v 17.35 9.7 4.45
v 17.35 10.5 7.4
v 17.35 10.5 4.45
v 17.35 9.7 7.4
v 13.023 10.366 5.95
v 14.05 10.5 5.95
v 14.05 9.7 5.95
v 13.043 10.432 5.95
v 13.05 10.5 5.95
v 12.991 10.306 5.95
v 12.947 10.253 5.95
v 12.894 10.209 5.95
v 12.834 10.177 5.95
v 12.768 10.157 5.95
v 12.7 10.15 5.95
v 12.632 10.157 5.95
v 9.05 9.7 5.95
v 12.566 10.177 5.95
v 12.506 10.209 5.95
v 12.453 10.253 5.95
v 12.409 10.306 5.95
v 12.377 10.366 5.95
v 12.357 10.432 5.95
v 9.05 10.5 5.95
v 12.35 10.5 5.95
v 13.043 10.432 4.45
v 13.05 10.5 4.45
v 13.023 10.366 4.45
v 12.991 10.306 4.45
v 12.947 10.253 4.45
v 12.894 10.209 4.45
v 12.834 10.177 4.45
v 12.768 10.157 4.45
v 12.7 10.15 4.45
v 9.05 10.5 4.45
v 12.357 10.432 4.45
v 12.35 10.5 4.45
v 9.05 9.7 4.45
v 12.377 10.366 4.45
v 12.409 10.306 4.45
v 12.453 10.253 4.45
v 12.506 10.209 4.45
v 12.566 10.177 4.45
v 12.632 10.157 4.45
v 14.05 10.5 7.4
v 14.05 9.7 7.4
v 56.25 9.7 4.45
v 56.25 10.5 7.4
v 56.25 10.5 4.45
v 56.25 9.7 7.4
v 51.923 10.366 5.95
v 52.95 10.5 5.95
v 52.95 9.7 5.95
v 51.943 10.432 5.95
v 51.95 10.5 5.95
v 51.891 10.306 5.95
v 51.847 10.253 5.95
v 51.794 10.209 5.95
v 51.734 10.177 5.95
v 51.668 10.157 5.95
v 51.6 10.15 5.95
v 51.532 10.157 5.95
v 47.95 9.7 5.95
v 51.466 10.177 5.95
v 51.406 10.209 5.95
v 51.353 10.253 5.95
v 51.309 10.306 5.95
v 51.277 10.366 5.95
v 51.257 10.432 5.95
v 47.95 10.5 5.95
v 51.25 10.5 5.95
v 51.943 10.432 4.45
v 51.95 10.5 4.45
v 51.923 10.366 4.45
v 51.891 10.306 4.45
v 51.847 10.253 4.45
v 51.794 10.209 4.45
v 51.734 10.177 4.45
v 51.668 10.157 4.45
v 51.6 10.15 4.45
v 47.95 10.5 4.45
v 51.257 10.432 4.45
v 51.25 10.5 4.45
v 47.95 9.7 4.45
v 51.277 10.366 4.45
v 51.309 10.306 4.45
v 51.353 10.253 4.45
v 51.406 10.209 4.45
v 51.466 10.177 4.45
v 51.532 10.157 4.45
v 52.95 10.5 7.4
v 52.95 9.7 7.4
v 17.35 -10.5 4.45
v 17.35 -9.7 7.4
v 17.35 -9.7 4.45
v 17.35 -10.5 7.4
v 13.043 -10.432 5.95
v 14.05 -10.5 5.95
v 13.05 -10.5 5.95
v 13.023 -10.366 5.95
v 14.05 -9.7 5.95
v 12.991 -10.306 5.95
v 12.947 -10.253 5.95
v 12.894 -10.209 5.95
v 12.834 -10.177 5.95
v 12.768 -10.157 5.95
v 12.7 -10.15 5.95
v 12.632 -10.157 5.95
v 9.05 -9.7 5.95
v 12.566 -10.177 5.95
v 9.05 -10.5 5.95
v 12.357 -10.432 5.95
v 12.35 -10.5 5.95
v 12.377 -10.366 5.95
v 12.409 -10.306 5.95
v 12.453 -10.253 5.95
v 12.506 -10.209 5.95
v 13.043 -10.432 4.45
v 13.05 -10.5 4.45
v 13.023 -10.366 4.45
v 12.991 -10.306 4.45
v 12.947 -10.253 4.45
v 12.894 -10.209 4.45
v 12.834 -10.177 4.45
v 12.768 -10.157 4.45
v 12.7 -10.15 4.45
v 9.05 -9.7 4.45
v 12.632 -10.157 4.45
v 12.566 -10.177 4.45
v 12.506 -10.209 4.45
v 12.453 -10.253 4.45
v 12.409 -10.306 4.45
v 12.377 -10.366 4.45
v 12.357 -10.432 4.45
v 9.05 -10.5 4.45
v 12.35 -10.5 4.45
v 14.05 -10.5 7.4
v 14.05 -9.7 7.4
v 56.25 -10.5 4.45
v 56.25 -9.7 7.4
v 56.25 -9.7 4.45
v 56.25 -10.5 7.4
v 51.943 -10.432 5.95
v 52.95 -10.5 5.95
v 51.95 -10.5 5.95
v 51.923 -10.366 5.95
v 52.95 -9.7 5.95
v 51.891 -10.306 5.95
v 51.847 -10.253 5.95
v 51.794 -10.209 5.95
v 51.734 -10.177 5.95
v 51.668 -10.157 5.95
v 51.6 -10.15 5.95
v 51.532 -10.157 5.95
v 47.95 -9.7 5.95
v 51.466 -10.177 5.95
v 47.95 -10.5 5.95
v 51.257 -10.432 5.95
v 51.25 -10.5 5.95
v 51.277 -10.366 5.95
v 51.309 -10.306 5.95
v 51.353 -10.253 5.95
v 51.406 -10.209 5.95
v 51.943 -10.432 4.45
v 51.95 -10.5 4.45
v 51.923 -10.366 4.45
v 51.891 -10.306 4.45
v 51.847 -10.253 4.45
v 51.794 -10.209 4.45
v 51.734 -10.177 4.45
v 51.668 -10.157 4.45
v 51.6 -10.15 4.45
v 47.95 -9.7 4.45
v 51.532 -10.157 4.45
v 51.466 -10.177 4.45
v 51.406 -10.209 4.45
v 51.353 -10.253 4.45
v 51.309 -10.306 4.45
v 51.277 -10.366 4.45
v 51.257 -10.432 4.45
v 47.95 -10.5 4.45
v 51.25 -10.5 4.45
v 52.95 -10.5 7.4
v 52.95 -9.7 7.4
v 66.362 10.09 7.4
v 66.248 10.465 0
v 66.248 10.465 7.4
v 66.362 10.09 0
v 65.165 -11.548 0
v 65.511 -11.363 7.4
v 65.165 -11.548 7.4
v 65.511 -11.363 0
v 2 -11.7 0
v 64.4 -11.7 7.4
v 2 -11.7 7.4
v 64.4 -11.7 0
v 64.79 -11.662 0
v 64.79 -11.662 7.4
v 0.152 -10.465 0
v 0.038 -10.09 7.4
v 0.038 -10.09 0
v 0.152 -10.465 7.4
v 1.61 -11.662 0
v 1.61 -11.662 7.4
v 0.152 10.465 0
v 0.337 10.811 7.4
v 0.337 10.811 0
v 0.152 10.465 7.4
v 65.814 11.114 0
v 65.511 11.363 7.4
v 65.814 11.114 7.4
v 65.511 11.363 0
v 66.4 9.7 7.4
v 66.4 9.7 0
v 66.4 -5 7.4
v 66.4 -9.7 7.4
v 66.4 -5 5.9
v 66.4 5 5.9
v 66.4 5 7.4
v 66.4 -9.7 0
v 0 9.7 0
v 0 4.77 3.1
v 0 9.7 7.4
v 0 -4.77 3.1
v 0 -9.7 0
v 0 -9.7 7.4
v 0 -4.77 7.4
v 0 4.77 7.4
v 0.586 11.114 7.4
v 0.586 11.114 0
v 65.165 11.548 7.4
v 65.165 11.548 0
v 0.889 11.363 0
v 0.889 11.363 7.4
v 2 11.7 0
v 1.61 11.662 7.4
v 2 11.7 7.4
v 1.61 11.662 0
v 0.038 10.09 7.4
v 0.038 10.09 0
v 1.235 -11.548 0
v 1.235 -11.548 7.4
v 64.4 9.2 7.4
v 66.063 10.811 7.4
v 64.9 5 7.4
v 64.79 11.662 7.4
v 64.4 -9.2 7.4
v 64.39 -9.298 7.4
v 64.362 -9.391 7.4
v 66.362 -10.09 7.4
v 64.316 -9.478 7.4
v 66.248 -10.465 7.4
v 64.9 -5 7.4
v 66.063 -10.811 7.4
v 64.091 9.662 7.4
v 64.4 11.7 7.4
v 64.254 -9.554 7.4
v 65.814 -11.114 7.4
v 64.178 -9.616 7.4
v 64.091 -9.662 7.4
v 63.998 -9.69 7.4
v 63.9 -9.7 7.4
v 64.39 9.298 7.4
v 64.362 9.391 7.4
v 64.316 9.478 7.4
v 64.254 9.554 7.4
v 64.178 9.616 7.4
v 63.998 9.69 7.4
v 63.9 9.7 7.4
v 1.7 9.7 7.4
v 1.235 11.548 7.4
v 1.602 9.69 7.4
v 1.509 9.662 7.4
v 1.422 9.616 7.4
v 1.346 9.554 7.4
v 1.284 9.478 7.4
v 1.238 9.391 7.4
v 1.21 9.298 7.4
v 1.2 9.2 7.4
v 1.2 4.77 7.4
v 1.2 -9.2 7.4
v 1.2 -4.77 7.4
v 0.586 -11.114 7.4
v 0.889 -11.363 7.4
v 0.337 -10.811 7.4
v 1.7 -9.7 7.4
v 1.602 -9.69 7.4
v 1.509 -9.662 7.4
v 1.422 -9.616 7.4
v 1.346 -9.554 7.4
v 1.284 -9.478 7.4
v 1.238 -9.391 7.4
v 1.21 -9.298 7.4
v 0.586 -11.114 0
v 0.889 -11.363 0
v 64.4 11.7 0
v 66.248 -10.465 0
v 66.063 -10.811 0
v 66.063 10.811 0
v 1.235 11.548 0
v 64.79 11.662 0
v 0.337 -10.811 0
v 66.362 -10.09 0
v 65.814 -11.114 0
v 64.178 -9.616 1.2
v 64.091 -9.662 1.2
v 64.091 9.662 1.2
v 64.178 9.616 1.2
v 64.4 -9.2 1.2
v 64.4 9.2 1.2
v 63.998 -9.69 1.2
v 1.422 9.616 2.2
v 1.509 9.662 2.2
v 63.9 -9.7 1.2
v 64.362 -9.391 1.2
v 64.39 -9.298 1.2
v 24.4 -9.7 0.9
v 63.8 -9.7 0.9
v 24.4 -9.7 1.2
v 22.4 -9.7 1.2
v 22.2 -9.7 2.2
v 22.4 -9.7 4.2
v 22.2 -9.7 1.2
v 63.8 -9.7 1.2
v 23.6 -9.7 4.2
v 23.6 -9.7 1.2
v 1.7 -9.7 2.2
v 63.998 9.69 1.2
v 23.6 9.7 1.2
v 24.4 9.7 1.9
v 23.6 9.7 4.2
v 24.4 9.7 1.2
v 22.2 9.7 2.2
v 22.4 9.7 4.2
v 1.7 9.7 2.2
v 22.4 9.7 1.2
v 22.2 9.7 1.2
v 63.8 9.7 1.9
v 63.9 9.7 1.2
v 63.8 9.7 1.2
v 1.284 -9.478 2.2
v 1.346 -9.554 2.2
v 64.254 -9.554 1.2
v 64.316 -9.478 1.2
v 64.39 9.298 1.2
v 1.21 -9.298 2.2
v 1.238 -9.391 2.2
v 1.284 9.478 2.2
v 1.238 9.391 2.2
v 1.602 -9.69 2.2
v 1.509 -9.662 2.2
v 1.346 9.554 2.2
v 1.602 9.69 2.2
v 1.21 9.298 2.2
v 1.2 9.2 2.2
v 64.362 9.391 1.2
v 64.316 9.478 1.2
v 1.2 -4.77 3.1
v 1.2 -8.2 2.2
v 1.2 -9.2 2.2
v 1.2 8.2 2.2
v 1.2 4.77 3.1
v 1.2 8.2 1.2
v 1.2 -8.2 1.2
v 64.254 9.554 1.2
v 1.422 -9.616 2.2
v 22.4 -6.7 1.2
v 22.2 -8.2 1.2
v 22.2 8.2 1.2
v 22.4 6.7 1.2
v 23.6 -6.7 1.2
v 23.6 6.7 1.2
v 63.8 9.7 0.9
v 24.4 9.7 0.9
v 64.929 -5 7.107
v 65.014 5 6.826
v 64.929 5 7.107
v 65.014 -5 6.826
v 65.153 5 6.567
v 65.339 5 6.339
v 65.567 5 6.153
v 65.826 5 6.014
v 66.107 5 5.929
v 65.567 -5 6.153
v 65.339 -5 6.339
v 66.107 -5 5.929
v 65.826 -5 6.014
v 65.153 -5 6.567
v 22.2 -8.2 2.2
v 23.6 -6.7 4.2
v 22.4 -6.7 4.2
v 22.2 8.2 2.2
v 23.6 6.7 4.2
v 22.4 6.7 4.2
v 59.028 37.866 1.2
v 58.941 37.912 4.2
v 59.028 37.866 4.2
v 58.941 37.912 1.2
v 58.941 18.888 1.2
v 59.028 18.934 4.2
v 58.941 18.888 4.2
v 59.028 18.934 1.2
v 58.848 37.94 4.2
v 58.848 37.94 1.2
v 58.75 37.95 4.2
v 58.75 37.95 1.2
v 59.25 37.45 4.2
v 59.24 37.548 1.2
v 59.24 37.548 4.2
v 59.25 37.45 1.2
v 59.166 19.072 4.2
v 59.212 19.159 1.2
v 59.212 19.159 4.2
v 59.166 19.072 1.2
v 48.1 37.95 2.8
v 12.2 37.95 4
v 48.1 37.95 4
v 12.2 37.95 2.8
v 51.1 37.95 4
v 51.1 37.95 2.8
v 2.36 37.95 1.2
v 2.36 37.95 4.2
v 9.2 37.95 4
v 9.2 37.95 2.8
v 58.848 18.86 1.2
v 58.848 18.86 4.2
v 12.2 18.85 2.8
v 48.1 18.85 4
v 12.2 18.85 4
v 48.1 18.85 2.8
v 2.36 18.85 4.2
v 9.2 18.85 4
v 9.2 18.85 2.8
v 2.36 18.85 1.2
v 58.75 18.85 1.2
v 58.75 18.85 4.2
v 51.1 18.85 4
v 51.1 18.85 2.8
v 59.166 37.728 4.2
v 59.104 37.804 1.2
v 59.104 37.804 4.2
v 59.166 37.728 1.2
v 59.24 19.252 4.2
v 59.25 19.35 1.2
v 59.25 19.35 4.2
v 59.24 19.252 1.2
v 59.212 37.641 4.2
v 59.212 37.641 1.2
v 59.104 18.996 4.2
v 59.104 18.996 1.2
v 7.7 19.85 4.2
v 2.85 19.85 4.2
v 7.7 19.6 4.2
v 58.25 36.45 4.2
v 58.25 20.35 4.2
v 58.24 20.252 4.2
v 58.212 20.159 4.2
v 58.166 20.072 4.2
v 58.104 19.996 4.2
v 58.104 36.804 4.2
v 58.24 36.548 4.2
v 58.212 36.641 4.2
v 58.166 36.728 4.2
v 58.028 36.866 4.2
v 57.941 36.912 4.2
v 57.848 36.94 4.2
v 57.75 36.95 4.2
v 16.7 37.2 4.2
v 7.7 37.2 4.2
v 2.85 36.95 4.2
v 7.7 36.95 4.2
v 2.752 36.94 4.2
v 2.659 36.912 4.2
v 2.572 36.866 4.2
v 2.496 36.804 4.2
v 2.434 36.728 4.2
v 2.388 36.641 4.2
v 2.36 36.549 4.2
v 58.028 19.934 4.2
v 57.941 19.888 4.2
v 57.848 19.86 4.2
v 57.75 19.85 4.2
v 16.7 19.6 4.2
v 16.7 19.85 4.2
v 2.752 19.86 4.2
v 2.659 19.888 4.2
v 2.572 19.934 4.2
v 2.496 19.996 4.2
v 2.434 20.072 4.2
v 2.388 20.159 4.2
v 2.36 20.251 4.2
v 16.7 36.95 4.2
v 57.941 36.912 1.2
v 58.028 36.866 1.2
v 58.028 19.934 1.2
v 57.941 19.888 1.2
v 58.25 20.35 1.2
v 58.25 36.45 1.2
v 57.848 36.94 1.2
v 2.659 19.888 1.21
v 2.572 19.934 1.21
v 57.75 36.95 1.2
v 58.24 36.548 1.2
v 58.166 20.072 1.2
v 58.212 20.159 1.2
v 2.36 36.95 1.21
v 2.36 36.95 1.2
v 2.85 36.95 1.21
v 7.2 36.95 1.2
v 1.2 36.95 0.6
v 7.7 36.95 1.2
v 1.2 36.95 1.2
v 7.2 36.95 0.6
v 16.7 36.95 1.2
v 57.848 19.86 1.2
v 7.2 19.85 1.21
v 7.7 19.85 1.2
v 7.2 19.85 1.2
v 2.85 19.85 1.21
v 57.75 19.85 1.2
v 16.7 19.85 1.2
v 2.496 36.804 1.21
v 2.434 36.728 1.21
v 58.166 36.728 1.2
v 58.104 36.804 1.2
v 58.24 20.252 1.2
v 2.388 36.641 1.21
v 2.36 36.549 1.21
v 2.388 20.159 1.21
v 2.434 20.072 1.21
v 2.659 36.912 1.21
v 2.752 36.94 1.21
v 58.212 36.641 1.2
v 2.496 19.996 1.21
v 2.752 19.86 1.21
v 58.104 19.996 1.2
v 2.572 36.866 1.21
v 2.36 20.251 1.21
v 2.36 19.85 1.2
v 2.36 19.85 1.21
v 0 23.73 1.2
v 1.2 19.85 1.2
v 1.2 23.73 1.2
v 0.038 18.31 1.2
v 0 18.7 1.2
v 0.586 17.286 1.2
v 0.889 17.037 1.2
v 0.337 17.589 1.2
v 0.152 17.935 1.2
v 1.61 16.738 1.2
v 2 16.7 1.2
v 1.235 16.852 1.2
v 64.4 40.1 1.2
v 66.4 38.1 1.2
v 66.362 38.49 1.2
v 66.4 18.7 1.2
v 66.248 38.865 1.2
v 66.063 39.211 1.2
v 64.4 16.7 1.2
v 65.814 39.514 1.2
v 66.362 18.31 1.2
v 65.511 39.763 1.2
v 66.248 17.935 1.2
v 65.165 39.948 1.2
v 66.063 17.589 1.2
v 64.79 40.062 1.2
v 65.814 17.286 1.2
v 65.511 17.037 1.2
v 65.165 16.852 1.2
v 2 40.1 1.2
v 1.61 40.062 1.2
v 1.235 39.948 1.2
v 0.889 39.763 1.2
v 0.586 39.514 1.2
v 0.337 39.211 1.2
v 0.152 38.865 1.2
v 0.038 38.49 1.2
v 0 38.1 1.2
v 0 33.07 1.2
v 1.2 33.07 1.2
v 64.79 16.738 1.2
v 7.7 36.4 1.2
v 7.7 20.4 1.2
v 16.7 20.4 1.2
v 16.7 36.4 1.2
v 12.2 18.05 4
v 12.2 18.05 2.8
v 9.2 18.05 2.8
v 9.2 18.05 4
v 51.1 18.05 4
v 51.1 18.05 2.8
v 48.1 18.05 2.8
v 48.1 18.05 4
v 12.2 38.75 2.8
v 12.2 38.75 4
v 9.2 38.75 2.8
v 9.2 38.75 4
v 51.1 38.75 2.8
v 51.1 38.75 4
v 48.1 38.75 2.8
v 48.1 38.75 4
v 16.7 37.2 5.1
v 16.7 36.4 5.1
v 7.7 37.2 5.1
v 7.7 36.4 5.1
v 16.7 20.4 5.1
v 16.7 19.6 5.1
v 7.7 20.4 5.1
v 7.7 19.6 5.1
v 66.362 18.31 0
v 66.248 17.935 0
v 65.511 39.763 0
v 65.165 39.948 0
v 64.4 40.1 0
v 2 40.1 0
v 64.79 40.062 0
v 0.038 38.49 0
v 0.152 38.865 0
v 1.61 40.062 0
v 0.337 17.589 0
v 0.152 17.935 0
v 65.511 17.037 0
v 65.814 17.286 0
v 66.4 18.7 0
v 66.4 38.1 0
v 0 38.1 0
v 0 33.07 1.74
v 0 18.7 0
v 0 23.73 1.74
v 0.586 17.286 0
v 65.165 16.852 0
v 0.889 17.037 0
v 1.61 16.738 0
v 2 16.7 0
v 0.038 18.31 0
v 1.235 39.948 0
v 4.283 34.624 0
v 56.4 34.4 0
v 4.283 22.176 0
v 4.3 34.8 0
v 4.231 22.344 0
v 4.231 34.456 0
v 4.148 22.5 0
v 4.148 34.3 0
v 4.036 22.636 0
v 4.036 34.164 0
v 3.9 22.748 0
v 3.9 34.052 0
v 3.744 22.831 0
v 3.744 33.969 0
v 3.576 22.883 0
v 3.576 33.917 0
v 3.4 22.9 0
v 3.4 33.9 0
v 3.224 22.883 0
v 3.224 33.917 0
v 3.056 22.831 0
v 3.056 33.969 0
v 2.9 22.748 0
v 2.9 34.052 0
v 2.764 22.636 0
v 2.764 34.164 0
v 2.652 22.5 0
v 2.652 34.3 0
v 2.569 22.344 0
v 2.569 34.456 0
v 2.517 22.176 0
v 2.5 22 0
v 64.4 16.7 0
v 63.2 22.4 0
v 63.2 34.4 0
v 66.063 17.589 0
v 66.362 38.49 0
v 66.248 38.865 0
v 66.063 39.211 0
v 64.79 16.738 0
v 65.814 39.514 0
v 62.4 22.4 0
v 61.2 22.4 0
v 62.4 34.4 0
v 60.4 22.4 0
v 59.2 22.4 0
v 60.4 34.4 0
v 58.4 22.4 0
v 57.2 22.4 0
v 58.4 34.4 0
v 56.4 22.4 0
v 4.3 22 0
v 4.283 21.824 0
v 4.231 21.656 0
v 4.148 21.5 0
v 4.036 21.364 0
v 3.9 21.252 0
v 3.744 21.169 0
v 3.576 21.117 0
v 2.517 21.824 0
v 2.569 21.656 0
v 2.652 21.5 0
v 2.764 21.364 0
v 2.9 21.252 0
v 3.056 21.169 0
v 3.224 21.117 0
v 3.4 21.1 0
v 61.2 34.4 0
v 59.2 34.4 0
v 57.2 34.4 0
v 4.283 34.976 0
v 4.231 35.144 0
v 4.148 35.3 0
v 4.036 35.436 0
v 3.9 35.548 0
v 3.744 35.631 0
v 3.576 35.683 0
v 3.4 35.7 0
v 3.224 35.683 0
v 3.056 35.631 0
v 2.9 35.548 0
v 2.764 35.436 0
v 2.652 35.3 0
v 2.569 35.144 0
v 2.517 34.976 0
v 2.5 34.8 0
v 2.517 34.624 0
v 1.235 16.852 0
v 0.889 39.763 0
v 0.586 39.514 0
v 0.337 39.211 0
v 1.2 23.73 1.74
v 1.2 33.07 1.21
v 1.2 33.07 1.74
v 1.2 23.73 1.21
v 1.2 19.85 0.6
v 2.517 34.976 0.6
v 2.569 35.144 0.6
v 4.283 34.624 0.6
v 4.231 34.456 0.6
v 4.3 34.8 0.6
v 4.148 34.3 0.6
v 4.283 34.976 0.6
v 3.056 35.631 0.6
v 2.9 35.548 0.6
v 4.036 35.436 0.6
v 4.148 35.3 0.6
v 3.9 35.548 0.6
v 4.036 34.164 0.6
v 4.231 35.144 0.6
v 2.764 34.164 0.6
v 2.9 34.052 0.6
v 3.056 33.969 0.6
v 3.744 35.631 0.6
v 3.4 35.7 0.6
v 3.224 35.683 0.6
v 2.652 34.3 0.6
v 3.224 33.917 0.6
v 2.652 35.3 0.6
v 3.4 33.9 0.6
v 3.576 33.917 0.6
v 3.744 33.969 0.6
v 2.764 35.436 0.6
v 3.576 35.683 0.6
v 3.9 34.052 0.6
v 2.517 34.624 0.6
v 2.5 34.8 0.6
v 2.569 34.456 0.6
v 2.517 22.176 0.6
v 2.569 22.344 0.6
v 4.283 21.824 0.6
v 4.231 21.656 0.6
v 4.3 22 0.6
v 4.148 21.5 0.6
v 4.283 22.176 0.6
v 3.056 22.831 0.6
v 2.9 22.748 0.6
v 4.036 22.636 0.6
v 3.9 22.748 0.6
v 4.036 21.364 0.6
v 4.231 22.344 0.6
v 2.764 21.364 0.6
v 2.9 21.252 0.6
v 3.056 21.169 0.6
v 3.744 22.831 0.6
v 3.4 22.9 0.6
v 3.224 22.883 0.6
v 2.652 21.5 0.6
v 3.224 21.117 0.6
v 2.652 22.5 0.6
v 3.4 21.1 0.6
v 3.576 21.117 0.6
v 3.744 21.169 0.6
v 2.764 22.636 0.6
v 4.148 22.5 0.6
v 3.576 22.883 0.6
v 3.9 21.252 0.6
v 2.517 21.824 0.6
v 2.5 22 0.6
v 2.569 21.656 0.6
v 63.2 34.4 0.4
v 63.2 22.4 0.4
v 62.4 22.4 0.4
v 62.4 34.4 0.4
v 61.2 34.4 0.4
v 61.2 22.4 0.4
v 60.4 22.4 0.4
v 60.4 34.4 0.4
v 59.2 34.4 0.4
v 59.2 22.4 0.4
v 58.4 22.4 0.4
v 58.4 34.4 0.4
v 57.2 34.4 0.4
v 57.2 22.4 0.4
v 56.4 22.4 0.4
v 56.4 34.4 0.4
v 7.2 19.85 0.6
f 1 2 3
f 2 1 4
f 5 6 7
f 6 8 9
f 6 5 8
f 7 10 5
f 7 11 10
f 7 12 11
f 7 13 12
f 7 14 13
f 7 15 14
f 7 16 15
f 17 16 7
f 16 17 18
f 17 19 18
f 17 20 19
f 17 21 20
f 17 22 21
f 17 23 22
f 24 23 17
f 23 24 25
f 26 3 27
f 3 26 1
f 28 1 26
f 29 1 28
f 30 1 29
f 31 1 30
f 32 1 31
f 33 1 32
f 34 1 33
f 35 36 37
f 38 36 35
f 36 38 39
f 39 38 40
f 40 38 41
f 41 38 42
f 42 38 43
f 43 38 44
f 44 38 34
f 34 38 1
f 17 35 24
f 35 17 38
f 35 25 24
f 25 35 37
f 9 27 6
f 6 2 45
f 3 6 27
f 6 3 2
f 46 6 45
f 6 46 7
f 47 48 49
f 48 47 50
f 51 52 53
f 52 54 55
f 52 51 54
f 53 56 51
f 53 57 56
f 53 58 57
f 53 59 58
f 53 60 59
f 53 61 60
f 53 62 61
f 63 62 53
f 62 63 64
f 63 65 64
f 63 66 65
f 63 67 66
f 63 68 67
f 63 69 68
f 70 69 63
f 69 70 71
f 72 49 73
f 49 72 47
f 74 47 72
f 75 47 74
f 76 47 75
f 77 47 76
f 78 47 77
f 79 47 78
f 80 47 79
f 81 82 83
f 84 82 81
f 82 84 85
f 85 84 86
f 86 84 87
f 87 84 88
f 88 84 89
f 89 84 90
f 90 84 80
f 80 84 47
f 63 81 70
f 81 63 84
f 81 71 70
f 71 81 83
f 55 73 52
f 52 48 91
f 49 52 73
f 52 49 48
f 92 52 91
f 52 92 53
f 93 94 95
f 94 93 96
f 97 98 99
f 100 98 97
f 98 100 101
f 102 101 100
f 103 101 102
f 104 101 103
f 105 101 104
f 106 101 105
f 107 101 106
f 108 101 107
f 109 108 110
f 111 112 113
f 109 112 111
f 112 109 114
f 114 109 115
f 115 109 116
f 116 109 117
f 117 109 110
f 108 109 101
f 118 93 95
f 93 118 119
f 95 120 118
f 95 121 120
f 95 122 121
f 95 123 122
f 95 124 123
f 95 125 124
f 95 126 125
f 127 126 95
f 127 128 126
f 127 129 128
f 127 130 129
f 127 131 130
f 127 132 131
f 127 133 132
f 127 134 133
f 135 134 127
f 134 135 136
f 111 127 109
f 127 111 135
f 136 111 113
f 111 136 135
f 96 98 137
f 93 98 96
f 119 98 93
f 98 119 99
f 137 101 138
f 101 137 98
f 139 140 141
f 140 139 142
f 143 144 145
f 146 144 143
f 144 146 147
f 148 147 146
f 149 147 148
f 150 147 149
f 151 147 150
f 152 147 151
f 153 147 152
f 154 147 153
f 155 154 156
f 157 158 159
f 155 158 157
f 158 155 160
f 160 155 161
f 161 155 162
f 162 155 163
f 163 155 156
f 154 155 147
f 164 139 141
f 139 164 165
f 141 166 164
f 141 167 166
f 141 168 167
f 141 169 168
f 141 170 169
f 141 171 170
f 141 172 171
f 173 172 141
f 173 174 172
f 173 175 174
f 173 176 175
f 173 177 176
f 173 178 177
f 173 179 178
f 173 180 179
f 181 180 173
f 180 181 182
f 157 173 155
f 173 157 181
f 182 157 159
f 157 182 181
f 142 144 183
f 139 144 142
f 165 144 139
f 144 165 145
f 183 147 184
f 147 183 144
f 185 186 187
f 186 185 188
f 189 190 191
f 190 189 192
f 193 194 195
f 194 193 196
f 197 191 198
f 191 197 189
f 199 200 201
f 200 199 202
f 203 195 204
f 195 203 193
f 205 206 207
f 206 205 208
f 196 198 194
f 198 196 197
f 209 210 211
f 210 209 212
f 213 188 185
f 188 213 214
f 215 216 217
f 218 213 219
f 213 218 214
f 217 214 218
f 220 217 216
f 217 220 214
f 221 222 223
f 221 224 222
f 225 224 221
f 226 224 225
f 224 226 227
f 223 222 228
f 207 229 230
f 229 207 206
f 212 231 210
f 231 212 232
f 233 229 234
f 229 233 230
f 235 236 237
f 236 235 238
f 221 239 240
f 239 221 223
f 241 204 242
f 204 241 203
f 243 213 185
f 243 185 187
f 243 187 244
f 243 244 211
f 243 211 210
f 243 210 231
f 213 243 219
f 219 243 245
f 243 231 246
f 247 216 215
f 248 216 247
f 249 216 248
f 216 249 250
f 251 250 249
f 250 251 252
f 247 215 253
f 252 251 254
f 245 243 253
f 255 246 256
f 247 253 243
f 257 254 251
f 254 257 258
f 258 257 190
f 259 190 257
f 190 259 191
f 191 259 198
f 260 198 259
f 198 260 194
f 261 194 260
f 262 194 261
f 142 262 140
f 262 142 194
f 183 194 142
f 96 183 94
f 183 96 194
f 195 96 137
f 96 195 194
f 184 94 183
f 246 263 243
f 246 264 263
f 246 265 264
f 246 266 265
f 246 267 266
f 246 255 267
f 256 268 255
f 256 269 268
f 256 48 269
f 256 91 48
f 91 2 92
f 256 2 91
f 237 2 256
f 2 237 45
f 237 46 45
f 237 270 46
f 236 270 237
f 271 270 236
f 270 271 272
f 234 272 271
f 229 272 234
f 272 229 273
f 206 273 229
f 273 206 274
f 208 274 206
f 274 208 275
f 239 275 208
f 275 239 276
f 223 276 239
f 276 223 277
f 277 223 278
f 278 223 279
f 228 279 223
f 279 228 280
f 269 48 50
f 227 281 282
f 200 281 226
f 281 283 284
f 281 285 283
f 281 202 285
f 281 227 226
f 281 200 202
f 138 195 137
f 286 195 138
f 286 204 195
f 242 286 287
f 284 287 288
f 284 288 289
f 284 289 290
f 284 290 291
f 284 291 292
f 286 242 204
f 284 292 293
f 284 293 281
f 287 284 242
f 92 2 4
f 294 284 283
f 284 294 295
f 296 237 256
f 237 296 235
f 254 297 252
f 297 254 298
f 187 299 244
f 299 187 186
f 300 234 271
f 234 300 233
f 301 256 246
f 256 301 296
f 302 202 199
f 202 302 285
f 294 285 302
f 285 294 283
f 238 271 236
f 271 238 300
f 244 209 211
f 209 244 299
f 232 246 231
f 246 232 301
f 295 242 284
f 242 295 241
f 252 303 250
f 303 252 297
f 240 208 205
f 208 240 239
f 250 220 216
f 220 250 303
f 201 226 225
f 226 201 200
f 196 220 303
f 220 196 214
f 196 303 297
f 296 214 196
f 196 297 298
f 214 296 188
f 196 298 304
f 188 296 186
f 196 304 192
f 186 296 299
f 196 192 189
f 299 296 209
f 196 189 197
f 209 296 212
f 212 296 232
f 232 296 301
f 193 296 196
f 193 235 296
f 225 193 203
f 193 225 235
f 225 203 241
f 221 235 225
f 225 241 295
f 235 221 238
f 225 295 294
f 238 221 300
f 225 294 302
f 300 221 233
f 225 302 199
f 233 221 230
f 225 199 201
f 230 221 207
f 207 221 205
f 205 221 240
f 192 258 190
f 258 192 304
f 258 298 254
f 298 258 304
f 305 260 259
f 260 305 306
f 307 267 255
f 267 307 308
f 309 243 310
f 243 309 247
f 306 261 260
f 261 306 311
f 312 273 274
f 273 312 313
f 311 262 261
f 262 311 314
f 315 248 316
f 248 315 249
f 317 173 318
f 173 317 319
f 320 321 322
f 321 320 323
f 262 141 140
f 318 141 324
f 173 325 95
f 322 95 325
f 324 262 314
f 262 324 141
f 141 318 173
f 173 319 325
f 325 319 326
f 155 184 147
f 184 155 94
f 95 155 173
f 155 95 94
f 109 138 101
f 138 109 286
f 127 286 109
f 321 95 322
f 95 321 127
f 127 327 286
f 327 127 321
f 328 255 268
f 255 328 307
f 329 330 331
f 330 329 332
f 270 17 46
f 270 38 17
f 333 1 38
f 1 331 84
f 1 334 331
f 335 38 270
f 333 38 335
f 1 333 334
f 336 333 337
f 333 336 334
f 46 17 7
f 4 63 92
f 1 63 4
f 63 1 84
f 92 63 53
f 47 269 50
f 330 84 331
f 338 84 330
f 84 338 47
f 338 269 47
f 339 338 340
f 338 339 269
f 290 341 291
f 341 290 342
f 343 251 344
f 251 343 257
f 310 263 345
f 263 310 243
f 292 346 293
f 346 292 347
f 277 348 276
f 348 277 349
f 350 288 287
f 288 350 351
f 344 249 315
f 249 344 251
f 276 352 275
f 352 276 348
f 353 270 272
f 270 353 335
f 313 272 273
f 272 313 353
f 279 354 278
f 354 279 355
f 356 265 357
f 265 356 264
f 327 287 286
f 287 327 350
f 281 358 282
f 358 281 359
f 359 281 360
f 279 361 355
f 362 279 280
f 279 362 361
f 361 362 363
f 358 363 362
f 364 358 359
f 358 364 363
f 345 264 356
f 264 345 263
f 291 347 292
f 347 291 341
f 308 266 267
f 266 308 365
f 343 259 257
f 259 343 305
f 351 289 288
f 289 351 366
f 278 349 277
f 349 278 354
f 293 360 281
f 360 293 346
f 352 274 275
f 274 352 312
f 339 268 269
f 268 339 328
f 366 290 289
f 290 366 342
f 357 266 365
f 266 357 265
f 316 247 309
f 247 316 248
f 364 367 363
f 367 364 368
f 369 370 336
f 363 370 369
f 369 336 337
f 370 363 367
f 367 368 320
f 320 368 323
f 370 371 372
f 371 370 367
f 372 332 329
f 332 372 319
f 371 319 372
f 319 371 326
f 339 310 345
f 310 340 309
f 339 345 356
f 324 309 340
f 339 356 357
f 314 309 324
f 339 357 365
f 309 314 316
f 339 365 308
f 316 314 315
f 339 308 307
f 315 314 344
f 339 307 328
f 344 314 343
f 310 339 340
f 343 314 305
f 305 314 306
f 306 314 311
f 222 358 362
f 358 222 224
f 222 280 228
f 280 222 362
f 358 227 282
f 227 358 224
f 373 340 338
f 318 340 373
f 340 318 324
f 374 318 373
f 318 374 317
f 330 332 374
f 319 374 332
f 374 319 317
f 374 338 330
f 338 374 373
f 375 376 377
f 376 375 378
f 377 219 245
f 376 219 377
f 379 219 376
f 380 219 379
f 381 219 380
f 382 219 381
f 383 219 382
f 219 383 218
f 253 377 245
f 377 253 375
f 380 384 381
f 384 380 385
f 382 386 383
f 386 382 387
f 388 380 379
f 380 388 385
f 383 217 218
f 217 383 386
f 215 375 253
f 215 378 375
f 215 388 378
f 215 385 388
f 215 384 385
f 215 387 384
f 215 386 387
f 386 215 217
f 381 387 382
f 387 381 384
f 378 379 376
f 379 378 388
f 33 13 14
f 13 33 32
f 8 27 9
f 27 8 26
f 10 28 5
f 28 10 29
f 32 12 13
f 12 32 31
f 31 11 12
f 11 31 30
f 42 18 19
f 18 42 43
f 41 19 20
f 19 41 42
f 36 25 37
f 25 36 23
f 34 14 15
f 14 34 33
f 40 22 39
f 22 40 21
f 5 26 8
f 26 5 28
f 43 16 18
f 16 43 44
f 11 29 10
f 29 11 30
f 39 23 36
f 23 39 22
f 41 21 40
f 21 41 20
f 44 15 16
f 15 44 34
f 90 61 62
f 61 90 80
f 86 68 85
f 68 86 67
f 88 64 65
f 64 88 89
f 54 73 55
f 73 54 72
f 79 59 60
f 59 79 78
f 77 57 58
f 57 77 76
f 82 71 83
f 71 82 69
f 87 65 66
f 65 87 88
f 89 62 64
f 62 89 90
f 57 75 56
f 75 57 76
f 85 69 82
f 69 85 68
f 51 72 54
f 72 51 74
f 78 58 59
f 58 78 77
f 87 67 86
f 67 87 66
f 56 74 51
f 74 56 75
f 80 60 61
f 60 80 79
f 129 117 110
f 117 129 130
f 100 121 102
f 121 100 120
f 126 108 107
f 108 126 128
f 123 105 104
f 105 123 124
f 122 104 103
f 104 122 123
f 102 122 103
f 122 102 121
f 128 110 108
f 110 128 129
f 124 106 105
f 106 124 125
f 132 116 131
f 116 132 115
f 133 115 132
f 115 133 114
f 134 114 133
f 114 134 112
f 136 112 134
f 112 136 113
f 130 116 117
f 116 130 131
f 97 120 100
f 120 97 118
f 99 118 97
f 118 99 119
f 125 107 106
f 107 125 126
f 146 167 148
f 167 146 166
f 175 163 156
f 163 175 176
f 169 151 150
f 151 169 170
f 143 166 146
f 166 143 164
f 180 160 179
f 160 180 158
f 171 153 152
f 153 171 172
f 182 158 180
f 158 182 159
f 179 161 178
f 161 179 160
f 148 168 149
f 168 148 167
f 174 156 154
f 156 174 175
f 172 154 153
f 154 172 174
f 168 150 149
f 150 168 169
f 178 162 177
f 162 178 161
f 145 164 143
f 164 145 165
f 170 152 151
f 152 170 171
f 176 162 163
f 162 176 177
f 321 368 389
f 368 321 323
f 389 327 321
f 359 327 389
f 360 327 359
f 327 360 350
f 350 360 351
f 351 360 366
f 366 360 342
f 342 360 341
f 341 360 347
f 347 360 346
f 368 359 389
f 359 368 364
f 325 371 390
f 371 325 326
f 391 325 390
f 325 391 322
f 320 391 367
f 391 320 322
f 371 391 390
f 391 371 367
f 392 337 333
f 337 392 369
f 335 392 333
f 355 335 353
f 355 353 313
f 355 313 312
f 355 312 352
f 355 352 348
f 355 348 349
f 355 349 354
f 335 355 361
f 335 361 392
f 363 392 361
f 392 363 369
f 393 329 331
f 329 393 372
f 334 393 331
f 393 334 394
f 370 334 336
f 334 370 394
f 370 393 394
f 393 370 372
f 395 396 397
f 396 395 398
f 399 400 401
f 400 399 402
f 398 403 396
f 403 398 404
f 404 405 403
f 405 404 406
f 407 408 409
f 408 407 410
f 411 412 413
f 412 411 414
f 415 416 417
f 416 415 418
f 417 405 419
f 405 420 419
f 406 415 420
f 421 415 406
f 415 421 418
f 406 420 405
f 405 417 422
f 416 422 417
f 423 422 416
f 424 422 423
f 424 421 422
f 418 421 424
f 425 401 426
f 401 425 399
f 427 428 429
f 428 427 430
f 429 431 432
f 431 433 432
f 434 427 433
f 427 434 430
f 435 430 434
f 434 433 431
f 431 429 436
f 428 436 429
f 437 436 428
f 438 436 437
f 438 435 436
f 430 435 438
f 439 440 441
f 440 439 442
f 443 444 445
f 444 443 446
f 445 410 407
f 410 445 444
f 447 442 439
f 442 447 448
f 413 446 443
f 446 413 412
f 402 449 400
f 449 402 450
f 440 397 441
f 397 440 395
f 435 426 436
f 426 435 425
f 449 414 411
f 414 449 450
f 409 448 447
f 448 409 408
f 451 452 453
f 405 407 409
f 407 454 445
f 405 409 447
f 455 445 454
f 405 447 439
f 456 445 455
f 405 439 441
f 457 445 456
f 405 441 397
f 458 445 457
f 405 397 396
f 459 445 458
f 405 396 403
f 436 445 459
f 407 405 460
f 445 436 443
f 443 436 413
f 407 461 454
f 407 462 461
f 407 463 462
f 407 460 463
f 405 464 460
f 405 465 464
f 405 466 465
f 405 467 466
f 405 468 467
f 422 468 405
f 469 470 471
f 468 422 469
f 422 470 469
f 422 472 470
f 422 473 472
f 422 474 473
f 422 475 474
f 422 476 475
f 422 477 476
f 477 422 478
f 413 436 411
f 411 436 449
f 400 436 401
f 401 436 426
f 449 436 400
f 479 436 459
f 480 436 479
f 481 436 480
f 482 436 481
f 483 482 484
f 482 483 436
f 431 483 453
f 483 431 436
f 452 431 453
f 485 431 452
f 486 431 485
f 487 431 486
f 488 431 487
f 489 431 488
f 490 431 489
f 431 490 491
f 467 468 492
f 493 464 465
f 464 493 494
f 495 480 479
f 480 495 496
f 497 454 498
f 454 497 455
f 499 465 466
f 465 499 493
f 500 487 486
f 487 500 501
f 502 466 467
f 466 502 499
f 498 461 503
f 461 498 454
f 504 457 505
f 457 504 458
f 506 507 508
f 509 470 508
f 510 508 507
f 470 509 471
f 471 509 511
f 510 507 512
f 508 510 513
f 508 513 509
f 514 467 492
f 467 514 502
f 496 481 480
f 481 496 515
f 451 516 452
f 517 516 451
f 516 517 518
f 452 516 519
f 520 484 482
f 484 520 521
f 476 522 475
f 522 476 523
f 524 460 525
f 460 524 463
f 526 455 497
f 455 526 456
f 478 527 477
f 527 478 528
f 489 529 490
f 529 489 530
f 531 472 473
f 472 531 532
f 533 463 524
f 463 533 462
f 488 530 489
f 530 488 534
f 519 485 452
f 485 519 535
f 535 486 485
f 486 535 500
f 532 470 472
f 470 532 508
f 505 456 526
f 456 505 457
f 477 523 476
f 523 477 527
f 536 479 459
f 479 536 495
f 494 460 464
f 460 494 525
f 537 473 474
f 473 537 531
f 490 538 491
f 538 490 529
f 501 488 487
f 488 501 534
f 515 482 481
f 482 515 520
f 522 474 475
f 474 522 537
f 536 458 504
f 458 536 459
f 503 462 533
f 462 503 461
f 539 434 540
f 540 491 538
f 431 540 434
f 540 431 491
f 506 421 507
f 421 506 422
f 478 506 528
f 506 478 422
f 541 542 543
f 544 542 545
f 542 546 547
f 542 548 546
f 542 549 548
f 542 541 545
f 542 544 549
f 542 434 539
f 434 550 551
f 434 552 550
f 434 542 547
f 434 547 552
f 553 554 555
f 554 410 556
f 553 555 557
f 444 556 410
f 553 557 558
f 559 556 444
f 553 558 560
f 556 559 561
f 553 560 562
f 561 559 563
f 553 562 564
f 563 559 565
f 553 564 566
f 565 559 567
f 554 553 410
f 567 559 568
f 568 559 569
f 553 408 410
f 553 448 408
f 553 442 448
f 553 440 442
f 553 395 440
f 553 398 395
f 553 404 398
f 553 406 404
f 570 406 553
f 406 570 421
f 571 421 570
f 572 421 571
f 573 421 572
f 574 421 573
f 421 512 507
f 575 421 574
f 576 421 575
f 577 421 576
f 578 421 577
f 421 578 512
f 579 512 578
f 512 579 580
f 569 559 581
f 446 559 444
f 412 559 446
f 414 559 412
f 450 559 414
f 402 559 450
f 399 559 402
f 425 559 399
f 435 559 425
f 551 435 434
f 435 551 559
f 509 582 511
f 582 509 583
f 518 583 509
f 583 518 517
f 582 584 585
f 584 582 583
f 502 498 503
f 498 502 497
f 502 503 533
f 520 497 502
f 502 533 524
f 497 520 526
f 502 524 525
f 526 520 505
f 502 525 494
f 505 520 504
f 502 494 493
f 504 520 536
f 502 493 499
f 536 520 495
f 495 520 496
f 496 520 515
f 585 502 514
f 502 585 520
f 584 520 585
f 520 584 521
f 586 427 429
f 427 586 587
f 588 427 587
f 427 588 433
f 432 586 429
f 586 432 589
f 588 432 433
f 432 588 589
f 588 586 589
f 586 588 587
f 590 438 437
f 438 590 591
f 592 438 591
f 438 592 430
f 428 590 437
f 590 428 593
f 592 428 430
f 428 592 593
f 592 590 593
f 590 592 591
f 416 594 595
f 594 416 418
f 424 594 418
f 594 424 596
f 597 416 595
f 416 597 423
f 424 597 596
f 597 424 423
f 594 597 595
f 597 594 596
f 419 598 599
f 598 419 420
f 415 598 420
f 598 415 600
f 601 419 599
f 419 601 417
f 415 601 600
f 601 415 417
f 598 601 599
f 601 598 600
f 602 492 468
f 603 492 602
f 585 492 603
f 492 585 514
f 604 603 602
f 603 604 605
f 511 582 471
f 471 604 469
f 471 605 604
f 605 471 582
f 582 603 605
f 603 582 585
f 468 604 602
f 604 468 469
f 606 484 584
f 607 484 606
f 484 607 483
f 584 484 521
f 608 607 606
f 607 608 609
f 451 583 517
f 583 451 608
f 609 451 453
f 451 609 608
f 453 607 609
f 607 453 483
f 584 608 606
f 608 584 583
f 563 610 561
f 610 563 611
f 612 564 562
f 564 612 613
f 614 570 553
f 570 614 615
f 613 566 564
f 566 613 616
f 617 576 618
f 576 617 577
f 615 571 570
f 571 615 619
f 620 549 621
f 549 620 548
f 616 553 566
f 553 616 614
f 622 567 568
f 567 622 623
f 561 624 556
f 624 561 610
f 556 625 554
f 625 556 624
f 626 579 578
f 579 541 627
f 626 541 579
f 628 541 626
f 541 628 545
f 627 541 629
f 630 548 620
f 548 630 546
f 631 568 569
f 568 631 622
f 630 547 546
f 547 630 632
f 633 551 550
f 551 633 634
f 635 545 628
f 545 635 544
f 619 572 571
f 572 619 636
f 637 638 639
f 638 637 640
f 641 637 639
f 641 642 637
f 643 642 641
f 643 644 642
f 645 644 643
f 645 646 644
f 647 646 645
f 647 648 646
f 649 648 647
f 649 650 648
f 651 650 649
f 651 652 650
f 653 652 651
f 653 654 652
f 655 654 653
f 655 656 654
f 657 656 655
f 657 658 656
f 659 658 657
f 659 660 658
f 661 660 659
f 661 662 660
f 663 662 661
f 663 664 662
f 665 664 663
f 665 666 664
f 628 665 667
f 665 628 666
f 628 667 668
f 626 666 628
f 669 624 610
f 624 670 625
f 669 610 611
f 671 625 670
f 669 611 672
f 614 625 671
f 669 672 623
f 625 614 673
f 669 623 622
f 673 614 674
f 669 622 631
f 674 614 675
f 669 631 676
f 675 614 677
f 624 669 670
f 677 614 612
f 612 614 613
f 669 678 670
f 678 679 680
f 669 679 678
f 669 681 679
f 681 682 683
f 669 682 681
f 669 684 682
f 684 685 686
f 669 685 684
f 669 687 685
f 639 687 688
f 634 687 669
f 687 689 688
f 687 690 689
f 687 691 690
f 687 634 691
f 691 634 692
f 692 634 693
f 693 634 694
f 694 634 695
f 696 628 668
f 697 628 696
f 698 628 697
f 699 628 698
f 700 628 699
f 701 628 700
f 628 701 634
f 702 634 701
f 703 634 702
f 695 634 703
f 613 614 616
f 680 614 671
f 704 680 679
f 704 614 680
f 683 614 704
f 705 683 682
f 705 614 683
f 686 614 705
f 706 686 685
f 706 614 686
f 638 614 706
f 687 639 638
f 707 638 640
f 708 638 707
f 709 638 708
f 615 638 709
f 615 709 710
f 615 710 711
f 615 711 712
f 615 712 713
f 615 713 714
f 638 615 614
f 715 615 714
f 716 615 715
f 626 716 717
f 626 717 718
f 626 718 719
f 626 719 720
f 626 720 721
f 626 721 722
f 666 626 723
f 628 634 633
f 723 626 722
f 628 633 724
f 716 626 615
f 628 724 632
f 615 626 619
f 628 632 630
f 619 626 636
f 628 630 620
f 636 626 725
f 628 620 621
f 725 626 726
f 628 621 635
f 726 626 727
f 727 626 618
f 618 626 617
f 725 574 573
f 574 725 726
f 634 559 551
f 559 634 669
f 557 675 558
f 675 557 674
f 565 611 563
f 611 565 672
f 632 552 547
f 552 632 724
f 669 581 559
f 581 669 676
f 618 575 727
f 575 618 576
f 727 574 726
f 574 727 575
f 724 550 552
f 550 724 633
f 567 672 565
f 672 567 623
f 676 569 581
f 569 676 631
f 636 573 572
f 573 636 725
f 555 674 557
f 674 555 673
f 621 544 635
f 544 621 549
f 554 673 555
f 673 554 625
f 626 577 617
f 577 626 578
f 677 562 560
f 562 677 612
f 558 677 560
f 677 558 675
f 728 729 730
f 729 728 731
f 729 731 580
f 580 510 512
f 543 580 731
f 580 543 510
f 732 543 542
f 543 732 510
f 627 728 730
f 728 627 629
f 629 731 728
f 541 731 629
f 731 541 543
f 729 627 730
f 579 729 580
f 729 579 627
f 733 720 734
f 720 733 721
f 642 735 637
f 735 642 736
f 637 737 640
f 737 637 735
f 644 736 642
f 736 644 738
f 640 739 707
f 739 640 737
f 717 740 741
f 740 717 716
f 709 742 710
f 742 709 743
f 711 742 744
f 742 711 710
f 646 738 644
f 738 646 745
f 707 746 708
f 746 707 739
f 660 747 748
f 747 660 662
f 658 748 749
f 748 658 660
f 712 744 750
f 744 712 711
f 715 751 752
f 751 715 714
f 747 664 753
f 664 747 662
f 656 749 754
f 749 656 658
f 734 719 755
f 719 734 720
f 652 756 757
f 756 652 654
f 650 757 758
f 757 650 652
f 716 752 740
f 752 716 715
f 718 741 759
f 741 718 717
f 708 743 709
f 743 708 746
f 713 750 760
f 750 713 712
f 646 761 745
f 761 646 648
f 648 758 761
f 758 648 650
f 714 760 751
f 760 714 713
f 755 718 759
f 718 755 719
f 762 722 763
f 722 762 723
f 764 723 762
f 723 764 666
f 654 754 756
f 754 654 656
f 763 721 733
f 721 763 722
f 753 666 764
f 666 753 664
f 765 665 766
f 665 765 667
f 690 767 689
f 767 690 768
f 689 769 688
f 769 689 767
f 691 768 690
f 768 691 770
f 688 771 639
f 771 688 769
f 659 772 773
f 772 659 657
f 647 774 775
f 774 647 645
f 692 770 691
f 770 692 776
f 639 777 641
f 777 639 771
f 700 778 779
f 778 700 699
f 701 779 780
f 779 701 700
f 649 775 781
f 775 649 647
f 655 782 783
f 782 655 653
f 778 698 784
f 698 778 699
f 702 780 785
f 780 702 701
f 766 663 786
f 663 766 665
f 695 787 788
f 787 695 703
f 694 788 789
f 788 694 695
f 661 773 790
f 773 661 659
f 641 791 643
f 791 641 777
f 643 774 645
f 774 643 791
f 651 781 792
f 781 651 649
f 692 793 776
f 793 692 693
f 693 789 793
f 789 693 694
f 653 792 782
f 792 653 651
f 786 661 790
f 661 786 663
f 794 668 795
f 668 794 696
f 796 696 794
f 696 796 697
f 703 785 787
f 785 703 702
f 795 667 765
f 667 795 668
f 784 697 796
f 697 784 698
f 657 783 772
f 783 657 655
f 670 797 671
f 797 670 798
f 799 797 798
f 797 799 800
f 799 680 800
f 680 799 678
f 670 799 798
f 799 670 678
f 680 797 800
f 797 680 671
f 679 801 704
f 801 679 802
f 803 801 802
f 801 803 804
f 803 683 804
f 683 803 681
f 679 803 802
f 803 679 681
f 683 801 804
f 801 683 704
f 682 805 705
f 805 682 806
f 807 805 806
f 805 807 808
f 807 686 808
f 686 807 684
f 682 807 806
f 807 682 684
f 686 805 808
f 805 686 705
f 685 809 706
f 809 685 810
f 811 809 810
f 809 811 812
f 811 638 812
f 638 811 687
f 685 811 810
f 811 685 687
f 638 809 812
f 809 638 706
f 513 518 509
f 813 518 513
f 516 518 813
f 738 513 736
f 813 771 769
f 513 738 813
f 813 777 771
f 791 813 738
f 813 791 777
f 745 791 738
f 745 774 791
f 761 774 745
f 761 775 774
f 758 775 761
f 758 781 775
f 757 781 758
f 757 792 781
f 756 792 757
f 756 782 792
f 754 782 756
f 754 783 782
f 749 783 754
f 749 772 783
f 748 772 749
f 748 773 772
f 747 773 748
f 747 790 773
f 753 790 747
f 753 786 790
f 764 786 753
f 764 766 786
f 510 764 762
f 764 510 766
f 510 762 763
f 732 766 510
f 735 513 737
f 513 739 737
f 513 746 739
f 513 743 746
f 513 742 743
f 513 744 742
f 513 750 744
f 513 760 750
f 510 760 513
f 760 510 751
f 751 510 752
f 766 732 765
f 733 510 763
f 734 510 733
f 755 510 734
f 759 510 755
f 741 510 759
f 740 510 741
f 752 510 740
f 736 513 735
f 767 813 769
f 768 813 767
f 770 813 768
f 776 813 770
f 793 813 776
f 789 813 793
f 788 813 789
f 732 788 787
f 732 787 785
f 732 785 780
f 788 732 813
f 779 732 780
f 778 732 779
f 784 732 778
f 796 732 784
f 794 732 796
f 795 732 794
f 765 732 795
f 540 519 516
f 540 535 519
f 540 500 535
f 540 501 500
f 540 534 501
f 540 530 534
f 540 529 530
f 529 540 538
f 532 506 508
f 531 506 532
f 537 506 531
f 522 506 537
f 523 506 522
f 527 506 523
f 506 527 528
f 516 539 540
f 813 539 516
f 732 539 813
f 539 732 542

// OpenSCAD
// SPDX-License-Identifier: AGPL-3.0-or-later
// "Slide" version of the XIAO ESP32S3 case (server-chassis lid: lugs in L slots, slide towards the USB end).
// Same geometry and parameters as xiao-esp32s3-case.scad: edit them there, both versions stay in step.

include <xiao-esp32s3-case.scad>
style = "slide";
